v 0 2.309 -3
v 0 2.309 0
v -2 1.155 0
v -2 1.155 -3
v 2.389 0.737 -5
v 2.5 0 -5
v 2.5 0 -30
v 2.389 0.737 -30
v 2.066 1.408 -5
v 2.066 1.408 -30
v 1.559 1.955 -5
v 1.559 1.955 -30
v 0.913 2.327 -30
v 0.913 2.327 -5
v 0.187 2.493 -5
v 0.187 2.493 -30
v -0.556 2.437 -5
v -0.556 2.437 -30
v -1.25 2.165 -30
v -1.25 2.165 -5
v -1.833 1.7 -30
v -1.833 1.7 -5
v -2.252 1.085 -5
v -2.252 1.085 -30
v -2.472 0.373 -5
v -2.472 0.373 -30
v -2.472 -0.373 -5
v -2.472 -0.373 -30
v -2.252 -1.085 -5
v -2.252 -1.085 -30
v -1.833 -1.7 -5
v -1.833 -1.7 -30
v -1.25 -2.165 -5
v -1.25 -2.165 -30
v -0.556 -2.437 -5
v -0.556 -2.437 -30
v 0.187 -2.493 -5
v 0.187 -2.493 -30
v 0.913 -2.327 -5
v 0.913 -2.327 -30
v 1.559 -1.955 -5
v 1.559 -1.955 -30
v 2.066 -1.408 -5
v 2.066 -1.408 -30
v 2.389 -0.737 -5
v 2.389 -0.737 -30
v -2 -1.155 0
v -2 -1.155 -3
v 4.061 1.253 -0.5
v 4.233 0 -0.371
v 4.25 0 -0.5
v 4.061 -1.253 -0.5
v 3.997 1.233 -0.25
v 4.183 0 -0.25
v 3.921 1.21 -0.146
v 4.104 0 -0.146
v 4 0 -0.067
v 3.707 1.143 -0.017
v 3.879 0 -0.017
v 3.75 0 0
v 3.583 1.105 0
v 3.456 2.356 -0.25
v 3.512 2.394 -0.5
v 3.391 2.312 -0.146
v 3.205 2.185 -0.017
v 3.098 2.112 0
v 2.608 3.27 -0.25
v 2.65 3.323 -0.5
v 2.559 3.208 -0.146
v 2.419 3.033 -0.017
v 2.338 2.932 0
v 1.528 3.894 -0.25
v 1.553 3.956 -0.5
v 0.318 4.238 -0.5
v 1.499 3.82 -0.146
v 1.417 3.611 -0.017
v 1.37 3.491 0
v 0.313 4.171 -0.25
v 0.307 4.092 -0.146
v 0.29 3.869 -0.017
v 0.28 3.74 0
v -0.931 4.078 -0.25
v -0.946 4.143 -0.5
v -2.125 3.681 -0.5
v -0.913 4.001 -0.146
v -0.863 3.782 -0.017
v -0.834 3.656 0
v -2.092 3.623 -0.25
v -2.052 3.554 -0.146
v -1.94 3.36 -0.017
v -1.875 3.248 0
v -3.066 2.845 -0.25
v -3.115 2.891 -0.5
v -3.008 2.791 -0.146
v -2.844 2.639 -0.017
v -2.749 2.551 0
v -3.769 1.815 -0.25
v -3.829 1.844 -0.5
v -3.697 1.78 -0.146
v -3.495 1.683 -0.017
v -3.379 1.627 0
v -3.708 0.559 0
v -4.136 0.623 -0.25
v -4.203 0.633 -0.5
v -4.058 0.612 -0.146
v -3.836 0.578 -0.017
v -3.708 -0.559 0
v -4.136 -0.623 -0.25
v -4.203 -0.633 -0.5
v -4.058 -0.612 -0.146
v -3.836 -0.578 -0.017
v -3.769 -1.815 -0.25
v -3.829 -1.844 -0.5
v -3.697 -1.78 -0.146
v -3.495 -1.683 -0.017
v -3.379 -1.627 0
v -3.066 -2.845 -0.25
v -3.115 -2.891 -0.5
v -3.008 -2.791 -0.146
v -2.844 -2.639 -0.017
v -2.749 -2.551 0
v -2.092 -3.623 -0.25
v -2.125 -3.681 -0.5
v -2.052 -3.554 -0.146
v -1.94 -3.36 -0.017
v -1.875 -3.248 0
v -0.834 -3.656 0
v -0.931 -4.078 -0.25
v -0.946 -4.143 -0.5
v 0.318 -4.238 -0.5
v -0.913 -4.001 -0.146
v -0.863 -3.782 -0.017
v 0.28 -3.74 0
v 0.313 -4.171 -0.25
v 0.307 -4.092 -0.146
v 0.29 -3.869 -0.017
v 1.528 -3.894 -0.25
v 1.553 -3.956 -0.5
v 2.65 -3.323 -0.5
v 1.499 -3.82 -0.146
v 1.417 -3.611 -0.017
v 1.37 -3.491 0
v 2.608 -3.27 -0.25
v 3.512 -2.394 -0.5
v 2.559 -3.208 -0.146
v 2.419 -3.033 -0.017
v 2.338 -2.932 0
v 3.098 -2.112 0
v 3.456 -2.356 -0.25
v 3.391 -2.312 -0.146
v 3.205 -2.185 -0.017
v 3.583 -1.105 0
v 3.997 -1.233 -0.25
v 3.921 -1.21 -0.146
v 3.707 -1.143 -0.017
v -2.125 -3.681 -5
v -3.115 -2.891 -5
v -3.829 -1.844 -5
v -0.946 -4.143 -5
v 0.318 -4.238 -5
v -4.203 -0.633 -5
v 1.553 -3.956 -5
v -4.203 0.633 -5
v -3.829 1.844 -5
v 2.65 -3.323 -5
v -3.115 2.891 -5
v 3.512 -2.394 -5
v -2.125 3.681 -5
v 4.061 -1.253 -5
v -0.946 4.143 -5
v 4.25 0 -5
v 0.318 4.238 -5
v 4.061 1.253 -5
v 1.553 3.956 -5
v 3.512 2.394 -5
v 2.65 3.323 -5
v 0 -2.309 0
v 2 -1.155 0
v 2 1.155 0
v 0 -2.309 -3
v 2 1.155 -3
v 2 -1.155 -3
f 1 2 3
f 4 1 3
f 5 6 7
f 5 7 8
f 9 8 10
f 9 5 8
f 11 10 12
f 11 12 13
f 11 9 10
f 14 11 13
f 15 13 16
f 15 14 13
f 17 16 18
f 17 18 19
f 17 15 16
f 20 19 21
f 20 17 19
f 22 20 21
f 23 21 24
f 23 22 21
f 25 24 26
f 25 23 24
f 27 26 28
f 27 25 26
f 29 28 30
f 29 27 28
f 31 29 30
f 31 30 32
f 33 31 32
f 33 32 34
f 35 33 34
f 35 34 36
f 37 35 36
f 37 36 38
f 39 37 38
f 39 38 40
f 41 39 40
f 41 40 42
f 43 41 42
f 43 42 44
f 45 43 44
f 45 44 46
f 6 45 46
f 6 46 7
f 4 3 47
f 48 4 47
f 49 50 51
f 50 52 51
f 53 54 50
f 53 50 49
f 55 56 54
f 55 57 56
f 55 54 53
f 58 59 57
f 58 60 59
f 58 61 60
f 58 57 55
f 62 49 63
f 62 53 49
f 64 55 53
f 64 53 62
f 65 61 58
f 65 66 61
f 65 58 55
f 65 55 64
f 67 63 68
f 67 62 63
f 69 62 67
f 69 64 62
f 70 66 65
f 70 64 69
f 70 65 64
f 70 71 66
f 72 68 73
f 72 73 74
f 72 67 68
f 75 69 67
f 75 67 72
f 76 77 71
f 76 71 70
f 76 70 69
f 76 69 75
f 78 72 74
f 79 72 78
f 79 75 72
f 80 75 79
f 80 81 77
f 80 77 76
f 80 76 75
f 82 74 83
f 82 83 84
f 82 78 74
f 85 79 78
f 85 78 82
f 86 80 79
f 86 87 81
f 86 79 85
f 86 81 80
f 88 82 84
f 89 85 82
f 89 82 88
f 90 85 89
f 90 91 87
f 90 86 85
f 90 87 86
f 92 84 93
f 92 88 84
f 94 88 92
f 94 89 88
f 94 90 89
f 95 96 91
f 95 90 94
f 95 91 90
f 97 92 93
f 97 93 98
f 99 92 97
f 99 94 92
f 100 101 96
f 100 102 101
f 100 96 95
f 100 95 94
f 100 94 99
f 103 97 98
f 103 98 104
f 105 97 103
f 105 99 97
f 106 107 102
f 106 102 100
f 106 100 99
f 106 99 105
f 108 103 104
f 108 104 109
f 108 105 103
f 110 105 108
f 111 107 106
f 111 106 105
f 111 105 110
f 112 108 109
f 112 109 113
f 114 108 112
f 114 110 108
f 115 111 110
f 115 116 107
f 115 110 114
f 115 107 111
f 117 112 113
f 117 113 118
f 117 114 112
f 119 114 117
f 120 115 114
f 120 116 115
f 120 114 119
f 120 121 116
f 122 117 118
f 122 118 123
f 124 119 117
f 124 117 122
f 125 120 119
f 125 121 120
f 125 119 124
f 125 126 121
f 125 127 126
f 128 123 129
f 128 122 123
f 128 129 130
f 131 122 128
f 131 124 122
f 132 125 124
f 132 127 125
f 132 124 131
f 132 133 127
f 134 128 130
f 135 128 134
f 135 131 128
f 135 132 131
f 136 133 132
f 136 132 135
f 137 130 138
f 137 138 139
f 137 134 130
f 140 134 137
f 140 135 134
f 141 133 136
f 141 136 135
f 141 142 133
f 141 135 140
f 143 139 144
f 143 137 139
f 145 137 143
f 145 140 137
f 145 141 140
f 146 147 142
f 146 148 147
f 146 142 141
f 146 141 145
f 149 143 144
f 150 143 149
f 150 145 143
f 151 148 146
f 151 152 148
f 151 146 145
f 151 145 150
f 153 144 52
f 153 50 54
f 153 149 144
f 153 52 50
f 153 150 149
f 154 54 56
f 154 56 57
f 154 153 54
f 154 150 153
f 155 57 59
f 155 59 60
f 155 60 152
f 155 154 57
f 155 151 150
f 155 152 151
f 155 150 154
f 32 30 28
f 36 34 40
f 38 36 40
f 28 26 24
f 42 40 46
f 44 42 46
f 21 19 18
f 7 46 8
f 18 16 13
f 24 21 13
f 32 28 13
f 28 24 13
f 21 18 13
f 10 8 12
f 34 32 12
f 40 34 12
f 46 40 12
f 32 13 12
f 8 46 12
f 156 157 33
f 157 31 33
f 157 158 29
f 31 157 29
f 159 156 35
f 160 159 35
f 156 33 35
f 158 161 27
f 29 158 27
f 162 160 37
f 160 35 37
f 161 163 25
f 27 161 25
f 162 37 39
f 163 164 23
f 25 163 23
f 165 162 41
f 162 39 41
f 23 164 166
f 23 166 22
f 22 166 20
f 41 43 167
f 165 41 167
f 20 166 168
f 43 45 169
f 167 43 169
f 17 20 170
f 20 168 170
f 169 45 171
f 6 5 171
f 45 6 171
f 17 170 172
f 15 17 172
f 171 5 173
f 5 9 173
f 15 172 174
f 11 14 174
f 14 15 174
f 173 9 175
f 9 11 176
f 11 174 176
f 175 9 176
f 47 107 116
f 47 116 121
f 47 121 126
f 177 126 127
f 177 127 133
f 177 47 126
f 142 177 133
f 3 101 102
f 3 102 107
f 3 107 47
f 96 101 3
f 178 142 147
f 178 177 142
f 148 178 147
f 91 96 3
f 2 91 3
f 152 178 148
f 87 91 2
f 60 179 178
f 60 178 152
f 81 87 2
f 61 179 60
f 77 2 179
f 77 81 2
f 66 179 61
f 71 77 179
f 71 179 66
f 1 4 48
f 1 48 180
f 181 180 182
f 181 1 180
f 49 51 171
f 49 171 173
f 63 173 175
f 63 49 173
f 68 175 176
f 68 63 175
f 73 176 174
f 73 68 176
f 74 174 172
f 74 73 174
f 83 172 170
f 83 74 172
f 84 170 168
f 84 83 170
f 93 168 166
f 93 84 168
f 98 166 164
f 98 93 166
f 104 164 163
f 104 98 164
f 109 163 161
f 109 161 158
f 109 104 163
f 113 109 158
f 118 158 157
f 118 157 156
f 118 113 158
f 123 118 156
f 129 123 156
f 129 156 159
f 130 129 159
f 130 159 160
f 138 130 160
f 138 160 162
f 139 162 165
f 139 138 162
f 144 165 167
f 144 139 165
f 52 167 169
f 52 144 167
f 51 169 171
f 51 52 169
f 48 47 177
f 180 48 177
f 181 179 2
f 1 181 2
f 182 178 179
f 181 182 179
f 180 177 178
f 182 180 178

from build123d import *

# Parameters (mm, degrees)
F0_R     = 4.25
F0_R_2   = 2.5
F1_DEPTH = 5
F2_DEPTH = 30
F3_DEPTH = 3
F4_R     = 0.5


with BuildPart() as f1:
    # F0 (on Top) → F1 (new body)
    with BuildSketch(Plane.XY):
        Circle(F0_R)
        Circle(F0_R_2, mode=Mode.SUBTRACT)
    extrude(amount=-F1_DEPTH)

    # F0 (on Top) → F2 (join)
    with BuildSketch(Plane.XY):
        Circle(F0_R_2)
        Polygon((0, 2.309401), (2, 1.154701), (2, -1.154701), (0, -2.309401), (-2, -1.154701), (-2, 1.154701), align=None, mode=Mode.SUBTRACT)
        Polygon((2, -1.154701), (2, 1.154701), (0, 2.309401), (-2, 1.154701), (-2, -1.154701), (0, -2.309401), align=None)
    extrude(amount=-F2_DEPTH)

    # F0 (on Top) → F3 (cut)
    with BuildSketch(Plane.XY):
        Polygon((2, -1.154701), (2, 1.154701), (0, 2.309401), (-2, 1.154701), (-2, -1.154701), (0, -2.309401), align=None)
    extrude(amount=-F3_DEPTH, mode=Mode.SUBTRACT)

    # F4
    f4_edges = [f1.edges().sort_by_distance(p)[0] for p in [
        (-4.25, 0, 0),
    ]]
    fillet(f4_edges, radius=F4_R)


solid = f1.part
